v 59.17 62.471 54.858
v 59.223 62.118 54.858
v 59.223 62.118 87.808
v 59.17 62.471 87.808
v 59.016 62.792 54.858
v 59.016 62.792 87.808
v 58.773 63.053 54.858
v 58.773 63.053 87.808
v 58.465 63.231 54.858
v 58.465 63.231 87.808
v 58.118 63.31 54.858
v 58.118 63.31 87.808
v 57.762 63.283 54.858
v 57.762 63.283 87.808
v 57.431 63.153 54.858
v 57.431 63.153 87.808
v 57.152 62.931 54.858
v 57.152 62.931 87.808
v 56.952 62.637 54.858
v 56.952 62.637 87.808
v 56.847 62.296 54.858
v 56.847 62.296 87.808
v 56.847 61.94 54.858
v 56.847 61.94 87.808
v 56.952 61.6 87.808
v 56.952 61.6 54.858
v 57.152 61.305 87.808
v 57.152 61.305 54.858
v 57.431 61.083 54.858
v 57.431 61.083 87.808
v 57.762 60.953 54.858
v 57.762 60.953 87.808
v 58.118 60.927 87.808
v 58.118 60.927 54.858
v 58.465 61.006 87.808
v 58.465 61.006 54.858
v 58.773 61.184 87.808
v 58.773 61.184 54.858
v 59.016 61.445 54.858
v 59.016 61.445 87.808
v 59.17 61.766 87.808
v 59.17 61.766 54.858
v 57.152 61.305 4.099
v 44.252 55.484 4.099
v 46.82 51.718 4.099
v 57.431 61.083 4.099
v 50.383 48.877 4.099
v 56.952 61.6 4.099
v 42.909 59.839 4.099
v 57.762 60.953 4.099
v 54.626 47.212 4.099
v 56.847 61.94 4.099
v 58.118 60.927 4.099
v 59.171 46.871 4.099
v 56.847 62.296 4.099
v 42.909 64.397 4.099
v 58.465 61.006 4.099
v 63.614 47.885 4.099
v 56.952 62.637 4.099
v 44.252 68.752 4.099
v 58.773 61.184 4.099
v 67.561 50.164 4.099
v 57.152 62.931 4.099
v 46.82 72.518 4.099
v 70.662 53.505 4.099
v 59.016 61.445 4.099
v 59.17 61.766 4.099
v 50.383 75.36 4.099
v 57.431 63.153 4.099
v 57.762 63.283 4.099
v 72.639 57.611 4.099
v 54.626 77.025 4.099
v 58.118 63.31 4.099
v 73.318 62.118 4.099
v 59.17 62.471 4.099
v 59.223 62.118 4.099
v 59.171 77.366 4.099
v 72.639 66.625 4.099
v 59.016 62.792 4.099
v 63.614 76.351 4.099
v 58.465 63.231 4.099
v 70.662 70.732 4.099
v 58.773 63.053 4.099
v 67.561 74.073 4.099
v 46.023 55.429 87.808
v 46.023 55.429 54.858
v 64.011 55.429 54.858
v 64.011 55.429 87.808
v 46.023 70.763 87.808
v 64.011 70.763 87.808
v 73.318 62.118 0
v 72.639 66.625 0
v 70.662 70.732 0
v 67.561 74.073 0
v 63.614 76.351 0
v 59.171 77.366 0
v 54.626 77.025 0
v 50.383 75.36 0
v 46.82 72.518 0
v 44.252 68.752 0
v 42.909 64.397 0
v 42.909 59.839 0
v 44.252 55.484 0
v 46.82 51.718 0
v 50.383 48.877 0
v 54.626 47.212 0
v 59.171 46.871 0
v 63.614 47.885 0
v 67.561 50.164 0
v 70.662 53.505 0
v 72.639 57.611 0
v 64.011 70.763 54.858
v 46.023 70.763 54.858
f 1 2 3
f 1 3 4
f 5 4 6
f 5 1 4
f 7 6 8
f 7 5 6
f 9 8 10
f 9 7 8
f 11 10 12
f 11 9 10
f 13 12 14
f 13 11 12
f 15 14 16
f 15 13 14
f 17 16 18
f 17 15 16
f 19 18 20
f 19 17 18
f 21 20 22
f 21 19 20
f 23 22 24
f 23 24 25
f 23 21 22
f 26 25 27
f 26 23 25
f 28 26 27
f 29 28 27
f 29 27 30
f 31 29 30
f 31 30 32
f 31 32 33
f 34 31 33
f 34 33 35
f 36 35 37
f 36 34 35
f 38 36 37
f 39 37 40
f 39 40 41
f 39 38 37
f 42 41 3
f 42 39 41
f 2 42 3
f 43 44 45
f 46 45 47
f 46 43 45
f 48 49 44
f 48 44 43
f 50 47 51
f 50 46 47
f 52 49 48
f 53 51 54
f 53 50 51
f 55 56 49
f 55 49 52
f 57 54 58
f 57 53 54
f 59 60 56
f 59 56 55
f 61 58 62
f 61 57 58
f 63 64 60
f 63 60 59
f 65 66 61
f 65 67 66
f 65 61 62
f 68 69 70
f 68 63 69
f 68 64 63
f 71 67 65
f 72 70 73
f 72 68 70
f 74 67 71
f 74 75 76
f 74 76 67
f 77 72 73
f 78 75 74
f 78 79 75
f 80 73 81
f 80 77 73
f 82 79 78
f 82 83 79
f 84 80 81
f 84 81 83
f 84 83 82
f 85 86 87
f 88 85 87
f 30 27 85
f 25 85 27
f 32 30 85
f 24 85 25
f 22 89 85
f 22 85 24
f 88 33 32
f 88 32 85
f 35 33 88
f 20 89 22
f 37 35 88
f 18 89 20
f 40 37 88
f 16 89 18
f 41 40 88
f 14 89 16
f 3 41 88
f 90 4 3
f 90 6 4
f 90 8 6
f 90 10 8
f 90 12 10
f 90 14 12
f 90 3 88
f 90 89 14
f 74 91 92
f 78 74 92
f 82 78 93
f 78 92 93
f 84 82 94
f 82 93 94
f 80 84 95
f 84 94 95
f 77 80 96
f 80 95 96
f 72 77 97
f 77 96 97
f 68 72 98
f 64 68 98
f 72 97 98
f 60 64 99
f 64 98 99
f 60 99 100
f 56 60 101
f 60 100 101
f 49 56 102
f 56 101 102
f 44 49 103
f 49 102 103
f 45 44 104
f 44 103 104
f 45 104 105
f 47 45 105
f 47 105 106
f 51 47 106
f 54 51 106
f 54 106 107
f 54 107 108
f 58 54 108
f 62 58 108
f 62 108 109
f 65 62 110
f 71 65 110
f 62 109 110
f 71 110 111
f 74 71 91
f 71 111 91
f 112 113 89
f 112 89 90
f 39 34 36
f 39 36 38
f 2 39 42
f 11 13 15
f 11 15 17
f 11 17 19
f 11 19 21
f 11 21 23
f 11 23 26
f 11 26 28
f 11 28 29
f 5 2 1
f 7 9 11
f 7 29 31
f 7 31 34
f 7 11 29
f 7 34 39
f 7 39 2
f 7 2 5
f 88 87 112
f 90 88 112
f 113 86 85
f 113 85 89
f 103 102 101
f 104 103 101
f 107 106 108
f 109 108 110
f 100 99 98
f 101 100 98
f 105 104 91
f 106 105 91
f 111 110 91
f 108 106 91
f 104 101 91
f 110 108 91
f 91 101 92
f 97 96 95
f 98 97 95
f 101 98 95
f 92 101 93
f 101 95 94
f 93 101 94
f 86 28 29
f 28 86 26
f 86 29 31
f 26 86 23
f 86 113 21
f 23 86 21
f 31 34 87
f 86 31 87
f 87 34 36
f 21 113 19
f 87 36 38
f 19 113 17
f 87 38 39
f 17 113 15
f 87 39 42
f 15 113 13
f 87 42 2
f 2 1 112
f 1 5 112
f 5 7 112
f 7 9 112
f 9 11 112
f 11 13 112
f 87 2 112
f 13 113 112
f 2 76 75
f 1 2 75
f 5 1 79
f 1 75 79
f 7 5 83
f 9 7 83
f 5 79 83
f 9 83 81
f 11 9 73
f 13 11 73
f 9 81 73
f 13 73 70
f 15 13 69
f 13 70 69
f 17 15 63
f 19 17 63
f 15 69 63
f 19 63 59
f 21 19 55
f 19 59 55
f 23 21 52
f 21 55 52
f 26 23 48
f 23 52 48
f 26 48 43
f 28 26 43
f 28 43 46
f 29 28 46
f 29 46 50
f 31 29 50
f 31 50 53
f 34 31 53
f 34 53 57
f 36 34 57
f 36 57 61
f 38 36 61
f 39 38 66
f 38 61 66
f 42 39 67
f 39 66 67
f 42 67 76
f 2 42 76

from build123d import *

# Parameters (mm, degrees)
F0_R     = 15.290078
F1_DEPTH = 4.098665
F2_R     = 1.195048
F3_DEPTH = 50.759038
F4_W     = 17.988403
F4_H     = 15.334837
F4_R     = 1.195048
F5_DEPTH = 32.950506


with BuildPart() as f1:
    # F0 (on Top) → F1 (new body)
    with BuildSketch(Plane.XY):
        with Locations((58.028266, 62.118329)):
            Circle(F0_R)
    extrude(amount=F1_DEPTH)

    # F2 (on face) → F3 (join)
    with BuildSketch(Plane.XY.offset(4.098665)):
        with Locations((58.028266, 62.118329)):
            Circle(F2_R)
    extrude(amount=F3_DEPTH)


with BuildPart() as f5:
    # F4 (on face) → F5 (new body)
    with BuildSketch(Plane.XY.offset(54.857703)):
        with Locations((55.017171, 63.09599)):
            Rectangle(F4_W, F4_H)
        with Locations((58.028266, 62.118329)):
            Circle(F4_R, mode=Mode.SUBTRACT)
    extrude(amount=F5_DEPTH)


solid = Compound([f1.part, f5.part])
